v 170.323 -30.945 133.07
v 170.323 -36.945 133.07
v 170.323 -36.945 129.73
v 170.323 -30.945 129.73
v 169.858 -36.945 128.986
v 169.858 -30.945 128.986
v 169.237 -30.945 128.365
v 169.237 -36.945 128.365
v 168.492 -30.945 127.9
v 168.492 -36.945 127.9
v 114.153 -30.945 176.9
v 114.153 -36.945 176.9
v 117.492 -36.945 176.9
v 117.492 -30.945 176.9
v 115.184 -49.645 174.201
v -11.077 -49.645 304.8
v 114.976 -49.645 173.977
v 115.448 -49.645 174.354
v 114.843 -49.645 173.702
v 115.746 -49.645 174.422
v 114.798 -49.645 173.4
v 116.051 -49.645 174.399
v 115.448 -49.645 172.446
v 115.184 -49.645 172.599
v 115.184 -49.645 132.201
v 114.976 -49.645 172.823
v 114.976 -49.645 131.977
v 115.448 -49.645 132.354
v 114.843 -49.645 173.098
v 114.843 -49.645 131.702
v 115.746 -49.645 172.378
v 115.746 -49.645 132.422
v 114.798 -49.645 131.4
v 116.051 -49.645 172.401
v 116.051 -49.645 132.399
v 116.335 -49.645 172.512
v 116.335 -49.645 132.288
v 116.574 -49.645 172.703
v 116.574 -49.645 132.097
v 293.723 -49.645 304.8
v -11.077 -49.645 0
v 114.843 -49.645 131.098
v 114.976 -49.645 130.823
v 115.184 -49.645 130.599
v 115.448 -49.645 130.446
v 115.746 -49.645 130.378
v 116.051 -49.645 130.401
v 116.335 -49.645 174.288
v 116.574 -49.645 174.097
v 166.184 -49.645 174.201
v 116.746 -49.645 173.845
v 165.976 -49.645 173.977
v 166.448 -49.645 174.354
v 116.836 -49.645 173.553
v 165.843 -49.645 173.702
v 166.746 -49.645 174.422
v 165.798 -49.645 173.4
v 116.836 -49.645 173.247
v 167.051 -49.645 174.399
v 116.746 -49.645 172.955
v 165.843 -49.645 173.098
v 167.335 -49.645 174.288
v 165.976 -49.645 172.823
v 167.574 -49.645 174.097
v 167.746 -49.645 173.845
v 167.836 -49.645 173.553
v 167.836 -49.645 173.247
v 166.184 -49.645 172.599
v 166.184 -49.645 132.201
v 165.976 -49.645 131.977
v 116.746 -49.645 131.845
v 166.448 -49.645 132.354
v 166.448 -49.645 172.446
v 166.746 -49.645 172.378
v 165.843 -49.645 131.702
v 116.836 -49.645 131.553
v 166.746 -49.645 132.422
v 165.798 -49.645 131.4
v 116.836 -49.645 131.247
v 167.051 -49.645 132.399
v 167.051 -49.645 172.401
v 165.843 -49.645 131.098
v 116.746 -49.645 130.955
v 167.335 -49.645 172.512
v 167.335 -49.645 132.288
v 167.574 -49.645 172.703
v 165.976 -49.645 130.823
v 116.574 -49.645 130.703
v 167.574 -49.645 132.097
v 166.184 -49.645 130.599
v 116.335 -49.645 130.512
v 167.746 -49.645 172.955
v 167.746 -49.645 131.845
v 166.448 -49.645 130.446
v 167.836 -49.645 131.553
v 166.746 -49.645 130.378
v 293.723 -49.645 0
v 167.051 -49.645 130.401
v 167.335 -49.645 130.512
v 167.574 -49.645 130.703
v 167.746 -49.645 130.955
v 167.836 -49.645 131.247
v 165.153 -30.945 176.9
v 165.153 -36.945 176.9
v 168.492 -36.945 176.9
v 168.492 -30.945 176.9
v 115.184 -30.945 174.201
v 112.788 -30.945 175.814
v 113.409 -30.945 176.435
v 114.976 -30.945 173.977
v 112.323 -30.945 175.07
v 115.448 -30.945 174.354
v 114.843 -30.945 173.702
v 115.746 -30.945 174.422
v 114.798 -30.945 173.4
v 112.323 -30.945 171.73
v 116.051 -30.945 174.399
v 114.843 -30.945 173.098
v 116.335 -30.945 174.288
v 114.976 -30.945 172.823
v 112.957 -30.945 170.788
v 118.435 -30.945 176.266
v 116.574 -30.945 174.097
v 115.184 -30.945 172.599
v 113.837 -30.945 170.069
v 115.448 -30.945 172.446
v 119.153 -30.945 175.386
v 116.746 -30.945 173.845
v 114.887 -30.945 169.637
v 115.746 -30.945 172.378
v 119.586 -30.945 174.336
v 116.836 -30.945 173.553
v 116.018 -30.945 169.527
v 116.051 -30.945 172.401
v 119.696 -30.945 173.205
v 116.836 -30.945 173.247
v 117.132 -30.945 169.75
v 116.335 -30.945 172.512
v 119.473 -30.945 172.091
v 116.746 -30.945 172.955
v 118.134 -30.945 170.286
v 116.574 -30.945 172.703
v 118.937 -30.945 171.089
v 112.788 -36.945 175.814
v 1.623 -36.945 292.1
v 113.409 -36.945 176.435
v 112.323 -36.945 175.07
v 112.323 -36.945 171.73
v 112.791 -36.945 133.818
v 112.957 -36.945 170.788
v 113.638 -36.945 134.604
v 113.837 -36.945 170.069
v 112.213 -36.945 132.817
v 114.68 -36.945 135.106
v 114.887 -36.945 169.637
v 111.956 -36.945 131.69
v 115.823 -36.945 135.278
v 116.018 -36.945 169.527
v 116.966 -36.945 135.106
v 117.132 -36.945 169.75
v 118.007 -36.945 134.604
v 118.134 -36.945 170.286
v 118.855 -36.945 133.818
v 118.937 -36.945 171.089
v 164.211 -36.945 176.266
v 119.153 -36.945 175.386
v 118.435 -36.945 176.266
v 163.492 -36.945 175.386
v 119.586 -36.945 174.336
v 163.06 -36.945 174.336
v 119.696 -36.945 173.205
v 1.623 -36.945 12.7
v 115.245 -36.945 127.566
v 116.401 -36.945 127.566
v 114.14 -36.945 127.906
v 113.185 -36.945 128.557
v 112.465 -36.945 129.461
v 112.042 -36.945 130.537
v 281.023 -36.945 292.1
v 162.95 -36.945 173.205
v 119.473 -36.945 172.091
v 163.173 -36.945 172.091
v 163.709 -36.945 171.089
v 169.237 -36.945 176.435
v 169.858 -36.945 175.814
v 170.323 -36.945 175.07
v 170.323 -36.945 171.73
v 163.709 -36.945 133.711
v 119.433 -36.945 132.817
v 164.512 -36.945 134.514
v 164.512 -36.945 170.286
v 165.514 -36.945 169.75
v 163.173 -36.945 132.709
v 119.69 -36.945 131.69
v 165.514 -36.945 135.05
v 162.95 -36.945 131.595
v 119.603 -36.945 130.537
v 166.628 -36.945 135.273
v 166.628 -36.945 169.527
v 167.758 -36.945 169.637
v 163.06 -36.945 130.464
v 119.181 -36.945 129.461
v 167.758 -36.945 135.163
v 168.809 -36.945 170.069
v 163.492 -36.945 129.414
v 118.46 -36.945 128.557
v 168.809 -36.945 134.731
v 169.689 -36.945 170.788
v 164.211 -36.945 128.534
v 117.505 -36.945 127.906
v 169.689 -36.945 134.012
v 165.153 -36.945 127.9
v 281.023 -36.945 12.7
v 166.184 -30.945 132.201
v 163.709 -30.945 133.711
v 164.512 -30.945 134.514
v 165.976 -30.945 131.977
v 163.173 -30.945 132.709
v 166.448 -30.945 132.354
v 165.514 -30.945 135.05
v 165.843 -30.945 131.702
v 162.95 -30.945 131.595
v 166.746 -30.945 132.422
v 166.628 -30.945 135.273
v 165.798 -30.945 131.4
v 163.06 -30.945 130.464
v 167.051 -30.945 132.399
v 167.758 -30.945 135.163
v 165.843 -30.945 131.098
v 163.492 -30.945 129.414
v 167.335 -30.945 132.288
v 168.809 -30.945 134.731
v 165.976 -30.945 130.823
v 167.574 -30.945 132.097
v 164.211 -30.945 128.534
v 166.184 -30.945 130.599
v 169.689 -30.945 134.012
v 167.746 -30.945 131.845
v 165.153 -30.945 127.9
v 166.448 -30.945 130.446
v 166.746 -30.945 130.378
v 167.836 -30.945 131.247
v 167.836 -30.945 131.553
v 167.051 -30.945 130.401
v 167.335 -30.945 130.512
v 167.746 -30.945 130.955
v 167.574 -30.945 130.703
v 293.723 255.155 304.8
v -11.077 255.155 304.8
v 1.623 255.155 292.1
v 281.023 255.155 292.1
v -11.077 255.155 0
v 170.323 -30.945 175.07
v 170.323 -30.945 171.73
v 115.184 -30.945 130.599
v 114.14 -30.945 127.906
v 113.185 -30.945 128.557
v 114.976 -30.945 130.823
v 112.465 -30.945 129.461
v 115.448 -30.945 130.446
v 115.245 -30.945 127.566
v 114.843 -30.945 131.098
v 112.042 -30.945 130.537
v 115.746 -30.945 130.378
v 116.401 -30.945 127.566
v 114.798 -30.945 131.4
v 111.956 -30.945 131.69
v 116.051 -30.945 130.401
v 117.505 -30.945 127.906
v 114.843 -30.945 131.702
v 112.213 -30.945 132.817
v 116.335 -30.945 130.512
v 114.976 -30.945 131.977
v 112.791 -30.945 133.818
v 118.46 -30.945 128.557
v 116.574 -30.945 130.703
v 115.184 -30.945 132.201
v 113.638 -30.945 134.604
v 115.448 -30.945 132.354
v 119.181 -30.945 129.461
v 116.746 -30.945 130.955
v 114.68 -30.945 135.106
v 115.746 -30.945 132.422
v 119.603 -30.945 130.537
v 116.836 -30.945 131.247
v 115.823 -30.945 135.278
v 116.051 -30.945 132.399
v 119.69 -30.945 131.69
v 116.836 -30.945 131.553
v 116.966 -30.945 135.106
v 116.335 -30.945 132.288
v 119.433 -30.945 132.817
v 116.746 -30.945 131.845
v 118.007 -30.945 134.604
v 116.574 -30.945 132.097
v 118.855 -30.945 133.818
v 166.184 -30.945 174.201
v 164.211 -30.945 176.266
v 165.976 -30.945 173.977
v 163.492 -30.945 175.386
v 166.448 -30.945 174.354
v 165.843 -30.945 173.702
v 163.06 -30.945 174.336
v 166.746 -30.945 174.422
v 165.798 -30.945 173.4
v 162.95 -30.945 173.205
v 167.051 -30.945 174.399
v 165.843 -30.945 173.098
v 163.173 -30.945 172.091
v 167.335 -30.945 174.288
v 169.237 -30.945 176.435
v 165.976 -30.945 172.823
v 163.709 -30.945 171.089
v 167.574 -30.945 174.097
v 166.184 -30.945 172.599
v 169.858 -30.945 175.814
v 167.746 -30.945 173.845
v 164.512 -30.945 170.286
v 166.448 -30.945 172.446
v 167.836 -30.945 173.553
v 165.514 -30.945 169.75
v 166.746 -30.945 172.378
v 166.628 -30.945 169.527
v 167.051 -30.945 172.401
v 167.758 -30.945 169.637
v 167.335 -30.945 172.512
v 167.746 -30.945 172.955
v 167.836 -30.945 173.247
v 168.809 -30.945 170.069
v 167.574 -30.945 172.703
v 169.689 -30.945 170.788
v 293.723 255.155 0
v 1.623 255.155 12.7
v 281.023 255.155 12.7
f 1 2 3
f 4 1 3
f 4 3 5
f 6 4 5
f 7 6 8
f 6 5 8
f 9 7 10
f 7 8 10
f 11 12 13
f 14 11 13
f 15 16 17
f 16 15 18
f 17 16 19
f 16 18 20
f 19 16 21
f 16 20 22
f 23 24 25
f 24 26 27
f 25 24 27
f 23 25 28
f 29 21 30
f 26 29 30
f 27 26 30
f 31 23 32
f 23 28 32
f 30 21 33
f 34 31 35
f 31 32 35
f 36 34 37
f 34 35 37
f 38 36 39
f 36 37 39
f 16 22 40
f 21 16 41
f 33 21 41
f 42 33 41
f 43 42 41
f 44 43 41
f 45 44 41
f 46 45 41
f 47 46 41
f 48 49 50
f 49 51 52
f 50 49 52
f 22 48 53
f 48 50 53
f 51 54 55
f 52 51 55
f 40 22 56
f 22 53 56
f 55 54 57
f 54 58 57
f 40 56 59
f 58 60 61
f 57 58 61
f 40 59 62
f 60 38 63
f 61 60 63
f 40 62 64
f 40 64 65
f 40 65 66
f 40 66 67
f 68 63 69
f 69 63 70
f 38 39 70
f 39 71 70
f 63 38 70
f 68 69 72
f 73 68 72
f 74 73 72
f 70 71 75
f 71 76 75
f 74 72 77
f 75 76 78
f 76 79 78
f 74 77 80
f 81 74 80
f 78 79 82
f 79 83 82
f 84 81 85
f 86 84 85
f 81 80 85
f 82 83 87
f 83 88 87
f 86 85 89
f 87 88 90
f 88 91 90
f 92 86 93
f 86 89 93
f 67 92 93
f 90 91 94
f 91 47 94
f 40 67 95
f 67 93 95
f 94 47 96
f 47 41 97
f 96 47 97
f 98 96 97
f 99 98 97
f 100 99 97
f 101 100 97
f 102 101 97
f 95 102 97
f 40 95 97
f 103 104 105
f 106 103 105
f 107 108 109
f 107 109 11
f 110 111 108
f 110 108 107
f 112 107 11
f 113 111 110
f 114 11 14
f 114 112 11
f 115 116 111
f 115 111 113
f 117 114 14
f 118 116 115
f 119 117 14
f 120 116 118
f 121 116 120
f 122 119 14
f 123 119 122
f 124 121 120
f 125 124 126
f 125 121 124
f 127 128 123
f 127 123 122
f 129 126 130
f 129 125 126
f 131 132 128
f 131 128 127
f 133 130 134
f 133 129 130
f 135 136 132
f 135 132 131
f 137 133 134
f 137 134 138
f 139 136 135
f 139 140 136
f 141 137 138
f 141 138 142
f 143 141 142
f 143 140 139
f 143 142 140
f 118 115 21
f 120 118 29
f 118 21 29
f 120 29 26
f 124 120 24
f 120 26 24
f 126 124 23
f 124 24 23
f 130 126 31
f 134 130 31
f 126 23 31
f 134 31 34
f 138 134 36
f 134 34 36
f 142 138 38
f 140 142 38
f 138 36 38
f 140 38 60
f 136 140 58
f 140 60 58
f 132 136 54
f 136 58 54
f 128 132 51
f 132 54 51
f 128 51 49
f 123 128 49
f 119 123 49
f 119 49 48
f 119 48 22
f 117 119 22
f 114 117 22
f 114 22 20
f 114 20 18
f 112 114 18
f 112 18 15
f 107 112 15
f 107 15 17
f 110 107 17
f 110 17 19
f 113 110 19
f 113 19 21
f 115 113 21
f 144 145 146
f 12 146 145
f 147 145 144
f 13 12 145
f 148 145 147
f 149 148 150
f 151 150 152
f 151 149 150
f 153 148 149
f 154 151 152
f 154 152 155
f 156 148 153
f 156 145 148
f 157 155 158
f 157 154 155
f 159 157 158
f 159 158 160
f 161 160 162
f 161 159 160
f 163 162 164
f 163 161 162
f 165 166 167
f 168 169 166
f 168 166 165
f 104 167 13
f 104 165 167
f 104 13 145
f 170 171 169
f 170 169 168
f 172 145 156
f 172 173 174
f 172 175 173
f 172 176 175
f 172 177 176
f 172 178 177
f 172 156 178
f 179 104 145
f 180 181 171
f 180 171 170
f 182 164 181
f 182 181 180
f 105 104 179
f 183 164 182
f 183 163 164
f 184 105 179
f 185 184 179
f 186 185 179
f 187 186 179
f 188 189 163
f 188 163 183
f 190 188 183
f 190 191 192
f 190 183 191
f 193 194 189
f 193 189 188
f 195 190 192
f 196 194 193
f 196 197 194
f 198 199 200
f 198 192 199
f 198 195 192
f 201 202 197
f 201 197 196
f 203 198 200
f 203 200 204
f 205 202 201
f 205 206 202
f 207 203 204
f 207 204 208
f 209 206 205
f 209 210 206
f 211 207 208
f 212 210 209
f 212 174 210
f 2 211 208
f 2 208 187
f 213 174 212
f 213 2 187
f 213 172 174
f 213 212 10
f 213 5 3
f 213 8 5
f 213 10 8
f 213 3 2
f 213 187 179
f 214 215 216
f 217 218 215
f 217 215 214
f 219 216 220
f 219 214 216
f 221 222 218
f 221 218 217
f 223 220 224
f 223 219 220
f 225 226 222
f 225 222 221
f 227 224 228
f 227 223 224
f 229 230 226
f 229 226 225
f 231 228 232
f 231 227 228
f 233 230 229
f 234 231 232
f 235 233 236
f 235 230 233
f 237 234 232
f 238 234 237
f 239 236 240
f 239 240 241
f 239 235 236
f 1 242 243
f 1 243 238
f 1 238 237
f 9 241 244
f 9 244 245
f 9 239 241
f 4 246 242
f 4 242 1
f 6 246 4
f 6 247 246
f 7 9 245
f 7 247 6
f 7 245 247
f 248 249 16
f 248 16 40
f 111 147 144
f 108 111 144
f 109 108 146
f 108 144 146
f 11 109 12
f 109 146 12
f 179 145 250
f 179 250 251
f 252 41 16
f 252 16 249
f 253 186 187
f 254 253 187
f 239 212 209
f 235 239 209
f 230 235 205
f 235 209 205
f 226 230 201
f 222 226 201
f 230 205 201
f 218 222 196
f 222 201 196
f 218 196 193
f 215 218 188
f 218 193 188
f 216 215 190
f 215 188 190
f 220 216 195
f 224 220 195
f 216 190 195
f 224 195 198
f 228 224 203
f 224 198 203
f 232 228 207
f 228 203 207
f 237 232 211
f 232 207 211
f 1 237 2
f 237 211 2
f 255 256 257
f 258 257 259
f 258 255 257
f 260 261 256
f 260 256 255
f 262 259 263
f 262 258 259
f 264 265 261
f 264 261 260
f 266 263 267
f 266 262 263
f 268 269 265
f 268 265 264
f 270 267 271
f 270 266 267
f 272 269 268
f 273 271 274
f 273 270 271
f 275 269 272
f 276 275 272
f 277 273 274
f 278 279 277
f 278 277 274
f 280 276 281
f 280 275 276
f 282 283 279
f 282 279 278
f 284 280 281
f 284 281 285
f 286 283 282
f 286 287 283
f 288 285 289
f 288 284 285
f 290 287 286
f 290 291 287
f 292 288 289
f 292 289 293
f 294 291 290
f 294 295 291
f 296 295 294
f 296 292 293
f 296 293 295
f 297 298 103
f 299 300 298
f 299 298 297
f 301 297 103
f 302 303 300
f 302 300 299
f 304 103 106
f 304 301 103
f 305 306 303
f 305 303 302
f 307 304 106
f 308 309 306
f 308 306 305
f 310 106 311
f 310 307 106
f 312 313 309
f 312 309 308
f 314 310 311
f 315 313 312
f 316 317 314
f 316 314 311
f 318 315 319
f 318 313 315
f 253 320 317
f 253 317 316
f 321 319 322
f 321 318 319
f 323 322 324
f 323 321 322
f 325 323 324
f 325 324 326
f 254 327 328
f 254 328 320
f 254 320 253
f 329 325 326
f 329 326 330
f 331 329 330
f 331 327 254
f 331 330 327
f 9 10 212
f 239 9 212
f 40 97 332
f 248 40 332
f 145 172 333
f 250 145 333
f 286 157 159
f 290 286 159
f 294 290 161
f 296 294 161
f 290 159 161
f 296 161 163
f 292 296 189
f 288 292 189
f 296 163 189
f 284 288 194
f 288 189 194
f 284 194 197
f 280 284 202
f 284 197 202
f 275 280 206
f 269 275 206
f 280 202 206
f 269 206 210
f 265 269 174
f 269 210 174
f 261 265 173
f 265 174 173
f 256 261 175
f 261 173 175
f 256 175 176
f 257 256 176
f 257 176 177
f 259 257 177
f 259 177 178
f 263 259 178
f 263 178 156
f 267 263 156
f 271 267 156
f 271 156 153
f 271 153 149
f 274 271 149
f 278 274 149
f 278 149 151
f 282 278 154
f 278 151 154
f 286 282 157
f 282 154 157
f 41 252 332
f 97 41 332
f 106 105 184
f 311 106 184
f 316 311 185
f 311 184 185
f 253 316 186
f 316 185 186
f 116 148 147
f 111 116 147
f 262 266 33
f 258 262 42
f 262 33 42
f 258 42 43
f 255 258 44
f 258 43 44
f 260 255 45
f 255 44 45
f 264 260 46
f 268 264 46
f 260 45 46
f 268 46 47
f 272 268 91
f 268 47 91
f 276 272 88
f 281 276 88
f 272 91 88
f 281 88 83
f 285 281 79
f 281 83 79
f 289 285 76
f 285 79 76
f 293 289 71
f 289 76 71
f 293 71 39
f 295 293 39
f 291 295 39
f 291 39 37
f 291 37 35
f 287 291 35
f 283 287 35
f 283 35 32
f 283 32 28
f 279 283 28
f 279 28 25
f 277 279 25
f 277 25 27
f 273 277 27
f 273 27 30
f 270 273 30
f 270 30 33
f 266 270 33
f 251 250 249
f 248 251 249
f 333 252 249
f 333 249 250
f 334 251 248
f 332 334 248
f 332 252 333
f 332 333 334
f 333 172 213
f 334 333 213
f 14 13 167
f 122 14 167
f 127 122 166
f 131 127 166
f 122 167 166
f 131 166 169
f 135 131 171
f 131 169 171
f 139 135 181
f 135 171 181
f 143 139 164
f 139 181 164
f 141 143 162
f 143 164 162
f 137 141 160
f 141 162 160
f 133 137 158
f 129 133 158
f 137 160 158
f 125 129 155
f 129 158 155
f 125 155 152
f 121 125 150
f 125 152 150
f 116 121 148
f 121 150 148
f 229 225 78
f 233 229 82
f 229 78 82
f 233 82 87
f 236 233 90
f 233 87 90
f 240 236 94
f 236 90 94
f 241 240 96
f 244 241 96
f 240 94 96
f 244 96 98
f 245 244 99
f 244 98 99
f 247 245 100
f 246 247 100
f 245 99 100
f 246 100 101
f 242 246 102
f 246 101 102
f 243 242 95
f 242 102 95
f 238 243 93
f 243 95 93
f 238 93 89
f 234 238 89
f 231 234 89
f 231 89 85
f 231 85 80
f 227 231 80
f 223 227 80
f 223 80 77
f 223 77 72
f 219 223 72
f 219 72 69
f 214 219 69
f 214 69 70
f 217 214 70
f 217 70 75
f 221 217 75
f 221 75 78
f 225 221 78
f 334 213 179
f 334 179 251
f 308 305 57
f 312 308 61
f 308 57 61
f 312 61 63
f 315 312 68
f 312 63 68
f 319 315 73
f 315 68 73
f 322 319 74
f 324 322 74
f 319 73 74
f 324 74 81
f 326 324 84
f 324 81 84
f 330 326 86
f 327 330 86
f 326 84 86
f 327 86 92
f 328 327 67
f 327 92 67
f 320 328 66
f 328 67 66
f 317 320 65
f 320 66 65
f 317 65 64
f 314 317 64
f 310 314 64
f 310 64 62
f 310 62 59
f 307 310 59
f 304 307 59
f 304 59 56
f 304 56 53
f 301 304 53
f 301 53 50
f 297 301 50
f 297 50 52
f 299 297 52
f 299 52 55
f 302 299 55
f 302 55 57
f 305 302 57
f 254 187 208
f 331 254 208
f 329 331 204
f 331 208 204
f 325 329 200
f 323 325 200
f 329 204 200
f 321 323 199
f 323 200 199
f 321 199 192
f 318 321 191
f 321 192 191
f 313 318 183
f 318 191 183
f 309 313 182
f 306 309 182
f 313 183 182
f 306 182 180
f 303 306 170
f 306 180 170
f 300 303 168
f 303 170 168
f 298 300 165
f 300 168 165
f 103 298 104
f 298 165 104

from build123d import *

# Parameters (mm, degrees)
SKETCH1_W                = 304.8
SKETCH1_H                = 304.8
BOSS_EXTRUDE2_DEPTH      = 304.8
SHELL1_T                 = -12.7
SKETCH2_R                = 3.877794573
BOSS_EXTRUDE3_DEPTH      = 6
M2_5X0_45_TAPPED_HOLE3_D = 2.05


with BuildPart() as part:
    # Sketch1 → Boss-Extrude2 (new body)
    with BuildSketch(Plane.XY):
        with Locations((141.322807232, 102.754701441)):
            Rectangle(SKETCH1_W, SKETCH1_H)
    extrude(amount=BOSS_EXTRUDE2_DEPTH)

    # Shell1
    shell1_openings = [part.faces().sort_by_distance(p)[0] for p in [
        (141.322807232, 255.154701441, 152.4),
    ]]
    offset(amount=SHELL1_T, openings=shell1_openings, kind=Kind.INTERSECTION)

    # Sketch2 → Boss-Extrude3 (add)
    with BuildSketch(Plane(origin=(0, -36.945298559, 0), x_dir=(1, 0, 0), z_dir=(0, 1, 0))):
        with Locations(Location((115.822807232, -131.4, 0), (0, 0, 270))):
            Circle(SKETCH2_R)
        with BuildLine():
            Line((168.492325351, -127.9), (165.153289112, -127.9))
            ThreePointArc((165.153289112, -127.9), (164.080792393, -134.142014839), (170.322807232, -133.069518119))
            Line((170.322807232, -133.069518119), (170.322807232, -129.730481881))
            ThreePointArc((170.322807232, -129.730481881), (169.56482207, -128.657985161), (168.492325351, -127.9))
        make_face()
        with BuildLine():
            ThreePointArc((117.492325351, -176.9), (118.56482207, -170.657985161), (112.322807232, -171.730481881))
            Line((112.322807232, -171.730481881), (112.322807232, -175.069518119))
            ThreePointArc((112.322807232, -175.069518119), (113.080792393, -176.142014839), (114.153289112, -176.9))
            Line((114.153289112, -176.9), (117.492325351, -176.9))
        make_face()
        with BuildLine():
            Line((170.322807232, -175.069518119), (170.322807232, -171.730481881))
            ThreePointArc((170.322807232, -171.730481881), (164.080792393, -170.657985161), (165.153289112, -176.9))
            Line((165.153289112, -176.9), (168.492325351, -176.9))
            ThreePointArc((168.492325351, -176.9), (169.56482207, -176.142014839), (170.322807232, -175.069518119))
        make_face()
    extrude(amount=BOSS_EXTRUDE3_DEPTH)

    # M2.5x0.45 Tapped Hole3 (through all)
    with Locations(Plane(origin=(0, -30.945298559, 0), x_dir=(1, 0, 0), z_dir=(0, 1, 0))):
        with Locations((115.822807232, -131.4), (166.822807232, -131.4), (166.822807232, -173.4), (115.822807232, -173.4)):
            Hole(M2_5X0_45_TAPPED_HOLE3_D / 2)


solid = part.part
